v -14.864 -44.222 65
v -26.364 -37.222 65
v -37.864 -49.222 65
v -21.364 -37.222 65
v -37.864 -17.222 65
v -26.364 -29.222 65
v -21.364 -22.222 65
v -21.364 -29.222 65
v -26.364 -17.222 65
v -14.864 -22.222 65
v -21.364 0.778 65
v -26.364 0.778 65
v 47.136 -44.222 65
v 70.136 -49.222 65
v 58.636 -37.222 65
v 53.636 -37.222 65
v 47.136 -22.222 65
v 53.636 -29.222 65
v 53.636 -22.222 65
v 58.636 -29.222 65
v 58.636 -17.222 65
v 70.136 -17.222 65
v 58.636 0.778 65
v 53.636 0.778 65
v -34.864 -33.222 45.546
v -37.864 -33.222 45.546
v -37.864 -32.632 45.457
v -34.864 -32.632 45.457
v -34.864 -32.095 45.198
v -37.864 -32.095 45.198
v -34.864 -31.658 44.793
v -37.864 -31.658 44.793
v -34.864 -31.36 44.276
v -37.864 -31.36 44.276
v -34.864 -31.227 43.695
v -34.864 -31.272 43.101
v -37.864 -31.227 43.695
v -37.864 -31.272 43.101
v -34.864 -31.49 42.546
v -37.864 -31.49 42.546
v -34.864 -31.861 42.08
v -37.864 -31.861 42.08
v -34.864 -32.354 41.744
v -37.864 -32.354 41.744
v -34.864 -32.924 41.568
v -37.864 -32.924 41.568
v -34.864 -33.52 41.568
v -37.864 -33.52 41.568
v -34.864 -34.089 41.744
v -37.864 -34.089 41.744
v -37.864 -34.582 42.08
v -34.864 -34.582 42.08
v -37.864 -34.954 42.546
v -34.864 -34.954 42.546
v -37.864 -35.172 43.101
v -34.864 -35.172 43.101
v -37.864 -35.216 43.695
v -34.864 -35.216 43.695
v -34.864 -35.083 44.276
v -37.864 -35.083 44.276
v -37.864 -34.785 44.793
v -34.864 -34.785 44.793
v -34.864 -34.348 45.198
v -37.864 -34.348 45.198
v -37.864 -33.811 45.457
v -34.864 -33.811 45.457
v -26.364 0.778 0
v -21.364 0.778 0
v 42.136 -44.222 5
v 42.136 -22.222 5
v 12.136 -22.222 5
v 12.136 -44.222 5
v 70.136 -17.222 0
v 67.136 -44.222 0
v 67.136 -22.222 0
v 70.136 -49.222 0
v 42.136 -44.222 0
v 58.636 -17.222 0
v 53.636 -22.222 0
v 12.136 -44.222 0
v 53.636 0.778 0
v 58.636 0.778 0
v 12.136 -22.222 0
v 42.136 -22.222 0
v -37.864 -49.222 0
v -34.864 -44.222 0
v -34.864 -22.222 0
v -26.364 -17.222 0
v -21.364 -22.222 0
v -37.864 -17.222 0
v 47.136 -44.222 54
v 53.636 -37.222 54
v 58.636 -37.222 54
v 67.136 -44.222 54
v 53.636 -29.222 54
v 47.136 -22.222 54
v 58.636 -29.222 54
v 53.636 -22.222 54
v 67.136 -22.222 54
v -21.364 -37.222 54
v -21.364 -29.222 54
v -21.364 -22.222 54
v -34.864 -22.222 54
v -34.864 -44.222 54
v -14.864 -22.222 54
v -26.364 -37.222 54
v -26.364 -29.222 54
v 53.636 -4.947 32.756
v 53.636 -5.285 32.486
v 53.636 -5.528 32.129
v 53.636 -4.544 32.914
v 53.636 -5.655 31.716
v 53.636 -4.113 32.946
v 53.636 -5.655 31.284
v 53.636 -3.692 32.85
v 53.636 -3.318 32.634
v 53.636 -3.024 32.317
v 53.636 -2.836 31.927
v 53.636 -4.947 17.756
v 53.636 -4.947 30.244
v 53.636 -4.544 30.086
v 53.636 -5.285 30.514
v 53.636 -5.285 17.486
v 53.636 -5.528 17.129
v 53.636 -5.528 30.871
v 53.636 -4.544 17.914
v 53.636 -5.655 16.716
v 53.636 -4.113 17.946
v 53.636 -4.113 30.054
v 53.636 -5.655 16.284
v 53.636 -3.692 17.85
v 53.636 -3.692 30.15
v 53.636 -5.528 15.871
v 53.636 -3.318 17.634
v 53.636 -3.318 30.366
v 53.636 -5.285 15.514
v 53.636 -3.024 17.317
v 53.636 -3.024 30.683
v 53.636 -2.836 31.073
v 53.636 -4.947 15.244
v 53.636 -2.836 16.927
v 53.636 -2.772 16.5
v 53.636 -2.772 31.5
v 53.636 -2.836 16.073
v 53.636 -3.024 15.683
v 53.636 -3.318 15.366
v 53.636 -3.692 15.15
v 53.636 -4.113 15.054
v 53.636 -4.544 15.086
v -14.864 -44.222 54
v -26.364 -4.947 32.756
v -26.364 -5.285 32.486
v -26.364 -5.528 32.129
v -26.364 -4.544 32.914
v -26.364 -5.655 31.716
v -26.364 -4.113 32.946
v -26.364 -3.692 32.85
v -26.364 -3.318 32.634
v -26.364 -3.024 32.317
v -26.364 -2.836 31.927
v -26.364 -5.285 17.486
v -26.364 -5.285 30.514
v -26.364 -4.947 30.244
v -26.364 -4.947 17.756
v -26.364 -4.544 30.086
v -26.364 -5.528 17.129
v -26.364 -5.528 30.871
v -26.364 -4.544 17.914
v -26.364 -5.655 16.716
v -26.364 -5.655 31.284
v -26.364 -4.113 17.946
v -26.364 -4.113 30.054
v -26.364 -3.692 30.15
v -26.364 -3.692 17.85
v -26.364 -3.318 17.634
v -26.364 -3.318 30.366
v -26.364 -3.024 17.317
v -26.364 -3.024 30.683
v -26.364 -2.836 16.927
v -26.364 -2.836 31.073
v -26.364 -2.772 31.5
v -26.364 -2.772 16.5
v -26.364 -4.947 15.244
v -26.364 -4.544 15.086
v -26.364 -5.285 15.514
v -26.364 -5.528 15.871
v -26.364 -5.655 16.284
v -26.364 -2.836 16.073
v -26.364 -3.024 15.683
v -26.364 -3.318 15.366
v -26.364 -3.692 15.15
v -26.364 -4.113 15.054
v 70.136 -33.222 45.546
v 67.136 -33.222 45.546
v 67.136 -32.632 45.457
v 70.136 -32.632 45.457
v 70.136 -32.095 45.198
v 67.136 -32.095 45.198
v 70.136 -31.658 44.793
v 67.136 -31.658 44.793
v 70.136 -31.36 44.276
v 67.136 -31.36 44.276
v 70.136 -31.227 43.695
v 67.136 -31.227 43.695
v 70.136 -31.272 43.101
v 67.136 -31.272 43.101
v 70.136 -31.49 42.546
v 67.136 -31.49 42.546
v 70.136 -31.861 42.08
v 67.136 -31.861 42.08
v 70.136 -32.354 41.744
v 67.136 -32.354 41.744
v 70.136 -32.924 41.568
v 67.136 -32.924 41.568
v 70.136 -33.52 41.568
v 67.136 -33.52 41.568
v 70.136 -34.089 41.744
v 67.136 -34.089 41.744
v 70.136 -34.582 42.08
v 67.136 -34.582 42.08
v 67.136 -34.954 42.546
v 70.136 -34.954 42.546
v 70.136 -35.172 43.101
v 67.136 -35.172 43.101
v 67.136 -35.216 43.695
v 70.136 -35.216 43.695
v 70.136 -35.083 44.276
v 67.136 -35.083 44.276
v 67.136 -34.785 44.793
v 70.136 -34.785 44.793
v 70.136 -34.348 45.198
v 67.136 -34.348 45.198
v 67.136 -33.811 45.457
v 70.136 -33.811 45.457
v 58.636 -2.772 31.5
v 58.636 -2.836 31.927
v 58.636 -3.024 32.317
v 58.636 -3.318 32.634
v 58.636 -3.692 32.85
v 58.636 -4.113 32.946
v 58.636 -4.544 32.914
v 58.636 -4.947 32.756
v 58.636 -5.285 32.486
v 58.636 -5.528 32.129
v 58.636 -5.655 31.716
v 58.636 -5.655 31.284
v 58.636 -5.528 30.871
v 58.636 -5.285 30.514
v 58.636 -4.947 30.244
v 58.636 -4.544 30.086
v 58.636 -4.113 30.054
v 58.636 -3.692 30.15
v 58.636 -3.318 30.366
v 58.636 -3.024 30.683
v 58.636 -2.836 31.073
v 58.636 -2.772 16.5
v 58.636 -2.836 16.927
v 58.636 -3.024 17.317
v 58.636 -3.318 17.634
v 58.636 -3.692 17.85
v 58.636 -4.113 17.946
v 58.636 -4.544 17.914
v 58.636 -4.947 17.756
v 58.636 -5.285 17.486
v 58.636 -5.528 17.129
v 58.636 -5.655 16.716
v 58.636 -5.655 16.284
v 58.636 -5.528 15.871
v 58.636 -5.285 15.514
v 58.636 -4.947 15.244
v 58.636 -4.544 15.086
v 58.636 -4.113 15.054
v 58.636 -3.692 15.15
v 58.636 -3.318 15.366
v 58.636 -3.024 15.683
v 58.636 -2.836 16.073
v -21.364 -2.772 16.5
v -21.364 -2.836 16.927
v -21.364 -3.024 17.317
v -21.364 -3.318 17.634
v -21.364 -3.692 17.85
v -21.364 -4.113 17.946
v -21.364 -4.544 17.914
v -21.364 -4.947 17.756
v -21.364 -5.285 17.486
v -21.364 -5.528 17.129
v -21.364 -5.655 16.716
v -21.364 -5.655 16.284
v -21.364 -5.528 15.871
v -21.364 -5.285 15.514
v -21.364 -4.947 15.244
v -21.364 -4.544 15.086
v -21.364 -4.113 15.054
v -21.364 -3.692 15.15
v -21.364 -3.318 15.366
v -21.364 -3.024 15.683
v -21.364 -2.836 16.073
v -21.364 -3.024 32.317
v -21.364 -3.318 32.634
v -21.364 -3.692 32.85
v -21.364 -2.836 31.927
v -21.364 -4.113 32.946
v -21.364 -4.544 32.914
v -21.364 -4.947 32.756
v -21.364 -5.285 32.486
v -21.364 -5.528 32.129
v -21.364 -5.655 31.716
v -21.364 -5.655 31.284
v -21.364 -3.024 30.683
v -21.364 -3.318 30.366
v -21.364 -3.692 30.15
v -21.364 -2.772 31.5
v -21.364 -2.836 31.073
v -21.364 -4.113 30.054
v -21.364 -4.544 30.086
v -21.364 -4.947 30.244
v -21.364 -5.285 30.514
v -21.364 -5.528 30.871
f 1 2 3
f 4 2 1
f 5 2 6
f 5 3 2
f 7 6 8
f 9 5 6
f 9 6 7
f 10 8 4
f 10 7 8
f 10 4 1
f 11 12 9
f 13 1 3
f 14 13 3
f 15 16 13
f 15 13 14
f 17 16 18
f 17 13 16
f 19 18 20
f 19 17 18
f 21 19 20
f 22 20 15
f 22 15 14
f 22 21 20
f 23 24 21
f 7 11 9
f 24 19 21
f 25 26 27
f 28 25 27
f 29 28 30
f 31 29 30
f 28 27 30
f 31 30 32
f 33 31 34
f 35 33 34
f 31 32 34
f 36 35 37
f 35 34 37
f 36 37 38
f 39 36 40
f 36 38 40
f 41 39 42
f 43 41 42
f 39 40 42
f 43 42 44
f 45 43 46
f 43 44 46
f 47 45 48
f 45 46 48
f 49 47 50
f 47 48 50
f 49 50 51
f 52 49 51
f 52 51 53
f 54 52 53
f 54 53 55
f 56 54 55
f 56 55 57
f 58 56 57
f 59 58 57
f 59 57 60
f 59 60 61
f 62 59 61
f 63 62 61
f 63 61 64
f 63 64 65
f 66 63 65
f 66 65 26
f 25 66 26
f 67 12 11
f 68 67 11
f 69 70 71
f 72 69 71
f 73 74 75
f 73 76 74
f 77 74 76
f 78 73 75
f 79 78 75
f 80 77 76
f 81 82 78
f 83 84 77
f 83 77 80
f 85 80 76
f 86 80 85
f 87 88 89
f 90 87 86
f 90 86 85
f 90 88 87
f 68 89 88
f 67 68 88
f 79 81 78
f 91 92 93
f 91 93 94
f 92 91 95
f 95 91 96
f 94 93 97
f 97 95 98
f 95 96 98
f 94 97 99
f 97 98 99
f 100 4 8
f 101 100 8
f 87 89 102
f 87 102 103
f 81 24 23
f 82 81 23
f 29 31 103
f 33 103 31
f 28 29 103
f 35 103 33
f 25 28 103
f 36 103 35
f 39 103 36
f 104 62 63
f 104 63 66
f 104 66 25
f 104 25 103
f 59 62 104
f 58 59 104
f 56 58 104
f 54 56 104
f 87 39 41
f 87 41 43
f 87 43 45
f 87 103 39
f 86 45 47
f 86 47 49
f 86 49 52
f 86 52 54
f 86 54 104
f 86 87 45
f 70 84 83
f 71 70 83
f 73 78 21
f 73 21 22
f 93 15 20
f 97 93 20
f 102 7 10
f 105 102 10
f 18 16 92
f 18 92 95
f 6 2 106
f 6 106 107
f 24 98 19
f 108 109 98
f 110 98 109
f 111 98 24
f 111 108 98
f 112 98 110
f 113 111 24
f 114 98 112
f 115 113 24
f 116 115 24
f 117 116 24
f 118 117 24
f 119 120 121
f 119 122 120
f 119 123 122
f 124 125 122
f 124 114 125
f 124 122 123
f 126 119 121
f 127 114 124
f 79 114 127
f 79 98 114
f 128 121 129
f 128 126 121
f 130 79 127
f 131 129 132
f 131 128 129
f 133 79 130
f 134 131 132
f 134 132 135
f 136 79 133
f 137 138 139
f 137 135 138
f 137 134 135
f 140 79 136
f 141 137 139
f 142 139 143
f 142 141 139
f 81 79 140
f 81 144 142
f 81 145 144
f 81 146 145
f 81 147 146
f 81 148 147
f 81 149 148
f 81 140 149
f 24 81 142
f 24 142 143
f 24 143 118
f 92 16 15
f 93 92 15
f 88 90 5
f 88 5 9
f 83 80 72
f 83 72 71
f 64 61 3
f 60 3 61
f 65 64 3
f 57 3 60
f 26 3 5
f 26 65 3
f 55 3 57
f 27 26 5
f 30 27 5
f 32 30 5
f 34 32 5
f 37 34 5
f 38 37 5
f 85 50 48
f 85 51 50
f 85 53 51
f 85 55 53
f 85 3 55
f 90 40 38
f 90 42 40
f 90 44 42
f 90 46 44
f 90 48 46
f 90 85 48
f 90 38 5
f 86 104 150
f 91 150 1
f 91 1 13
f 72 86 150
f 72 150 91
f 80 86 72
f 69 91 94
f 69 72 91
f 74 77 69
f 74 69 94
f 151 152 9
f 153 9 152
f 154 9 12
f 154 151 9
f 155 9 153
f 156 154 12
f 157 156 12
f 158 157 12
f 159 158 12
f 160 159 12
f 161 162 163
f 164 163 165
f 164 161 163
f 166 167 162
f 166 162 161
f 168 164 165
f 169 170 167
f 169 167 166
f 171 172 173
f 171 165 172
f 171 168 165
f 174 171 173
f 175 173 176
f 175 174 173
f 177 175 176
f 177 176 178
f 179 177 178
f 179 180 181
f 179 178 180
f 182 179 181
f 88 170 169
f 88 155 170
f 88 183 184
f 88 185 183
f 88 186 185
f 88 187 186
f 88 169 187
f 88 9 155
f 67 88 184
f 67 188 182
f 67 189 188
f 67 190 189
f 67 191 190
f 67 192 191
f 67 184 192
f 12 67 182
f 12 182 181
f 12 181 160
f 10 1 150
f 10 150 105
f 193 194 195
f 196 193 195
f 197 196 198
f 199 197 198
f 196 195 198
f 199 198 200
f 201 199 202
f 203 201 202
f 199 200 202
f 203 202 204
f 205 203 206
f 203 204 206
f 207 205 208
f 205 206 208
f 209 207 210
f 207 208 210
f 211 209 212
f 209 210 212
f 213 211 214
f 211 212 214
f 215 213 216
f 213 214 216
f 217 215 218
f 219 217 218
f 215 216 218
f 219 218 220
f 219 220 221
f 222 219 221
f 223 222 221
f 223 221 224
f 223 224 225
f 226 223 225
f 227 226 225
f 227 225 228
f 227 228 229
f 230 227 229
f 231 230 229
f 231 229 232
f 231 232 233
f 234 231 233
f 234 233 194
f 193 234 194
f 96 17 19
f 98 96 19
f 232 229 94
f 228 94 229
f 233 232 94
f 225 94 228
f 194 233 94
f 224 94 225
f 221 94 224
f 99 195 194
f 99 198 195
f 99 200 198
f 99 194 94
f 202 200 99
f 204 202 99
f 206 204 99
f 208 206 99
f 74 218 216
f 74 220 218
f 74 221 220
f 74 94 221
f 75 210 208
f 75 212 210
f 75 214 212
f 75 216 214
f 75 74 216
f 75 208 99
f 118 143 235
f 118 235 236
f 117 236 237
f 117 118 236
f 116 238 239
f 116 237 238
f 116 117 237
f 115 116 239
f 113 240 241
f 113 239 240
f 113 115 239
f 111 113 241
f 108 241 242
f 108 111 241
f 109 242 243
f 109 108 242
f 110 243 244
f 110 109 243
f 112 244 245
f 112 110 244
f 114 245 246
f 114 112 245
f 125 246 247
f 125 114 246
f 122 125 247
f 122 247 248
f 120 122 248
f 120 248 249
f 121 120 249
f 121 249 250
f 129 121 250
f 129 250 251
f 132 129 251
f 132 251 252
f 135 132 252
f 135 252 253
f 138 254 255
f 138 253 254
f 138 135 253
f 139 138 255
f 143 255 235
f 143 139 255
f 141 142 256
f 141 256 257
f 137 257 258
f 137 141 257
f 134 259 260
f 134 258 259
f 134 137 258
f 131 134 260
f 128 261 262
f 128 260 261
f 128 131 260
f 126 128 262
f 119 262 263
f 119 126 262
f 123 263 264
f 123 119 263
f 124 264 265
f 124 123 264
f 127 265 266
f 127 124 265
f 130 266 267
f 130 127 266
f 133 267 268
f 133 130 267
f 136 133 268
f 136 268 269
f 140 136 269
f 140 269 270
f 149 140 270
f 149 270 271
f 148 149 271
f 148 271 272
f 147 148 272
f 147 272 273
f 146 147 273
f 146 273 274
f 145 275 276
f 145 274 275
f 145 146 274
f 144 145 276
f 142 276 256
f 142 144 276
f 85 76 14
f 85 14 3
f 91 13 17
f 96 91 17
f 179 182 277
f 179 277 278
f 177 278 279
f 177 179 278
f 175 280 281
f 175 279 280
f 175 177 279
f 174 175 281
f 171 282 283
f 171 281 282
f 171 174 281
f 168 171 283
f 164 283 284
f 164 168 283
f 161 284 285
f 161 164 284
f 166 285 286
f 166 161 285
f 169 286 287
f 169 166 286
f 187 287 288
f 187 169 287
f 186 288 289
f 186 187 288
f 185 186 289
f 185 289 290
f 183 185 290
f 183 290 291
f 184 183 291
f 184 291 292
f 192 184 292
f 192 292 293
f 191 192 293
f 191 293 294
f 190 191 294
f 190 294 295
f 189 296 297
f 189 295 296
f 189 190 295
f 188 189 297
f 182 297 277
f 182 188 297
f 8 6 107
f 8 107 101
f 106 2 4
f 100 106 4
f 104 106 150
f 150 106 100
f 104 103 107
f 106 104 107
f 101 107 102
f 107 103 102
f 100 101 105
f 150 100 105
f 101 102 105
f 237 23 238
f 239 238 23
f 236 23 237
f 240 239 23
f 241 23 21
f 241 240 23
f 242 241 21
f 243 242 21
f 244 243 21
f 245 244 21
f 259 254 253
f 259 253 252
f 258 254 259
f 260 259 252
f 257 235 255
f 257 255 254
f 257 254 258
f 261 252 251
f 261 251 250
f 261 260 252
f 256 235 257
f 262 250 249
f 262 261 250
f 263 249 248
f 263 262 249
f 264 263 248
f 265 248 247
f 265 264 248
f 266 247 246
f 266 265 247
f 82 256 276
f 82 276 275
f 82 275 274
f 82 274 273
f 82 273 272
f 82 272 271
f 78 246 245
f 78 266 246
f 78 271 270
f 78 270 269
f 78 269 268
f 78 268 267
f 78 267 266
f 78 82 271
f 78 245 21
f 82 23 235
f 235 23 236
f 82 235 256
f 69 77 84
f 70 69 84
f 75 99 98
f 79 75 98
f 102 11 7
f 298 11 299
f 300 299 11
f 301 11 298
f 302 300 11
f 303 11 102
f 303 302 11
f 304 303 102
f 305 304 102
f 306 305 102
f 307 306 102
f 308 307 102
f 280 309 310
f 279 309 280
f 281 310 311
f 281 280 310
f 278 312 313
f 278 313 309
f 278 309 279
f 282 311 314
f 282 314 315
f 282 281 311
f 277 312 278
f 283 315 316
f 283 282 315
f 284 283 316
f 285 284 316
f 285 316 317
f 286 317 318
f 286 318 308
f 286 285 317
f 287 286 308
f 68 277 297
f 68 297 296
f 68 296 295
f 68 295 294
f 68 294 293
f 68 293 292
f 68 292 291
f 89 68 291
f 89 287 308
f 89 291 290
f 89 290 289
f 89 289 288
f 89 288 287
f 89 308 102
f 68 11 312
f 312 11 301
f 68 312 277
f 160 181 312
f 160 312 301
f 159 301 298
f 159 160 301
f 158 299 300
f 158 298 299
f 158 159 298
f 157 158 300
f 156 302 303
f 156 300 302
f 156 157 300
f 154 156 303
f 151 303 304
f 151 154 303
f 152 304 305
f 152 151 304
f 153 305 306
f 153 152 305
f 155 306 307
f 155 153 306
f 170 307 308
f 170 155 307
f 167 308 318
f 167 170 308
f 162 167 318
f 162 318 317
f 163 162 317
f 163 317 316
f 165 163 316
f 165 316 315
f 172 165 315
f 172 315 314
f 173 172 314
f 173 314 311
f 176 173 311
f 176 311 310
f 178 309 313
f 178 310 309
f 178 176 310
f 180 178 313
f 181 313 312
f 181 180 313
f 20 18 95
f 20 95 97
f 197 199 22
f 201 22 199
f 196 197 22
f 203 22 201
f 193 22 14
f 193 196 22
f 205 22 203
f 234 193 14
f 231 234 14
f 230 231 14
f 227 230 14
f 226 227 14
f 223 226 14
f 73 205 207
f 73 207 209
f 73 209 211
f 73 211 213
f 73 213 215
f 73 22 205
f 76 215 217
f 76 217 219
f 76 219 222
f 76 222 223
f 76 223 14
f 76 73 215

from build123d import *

# Parameters (mm, degrees)
EXTRUDE_1_DEPTH          = 65
SKETCH_3_R               = 2
CUT_EXTRUDE_2_DEPTH      = 136.321005452
SKETCH_4_W               = 30
SKETCH_4_H               = 22
EXTRUDE_2_DEPTH          = 5
CUT_EXTRUDE_4_DEPTH      = 123.556209621
CUT_EXTRUDE_4_DEPTH_BACK = 123.556209621
SKETCH_9_R               = 1.45
SKETCH_10_W              = 20
SKETCH_10_H              = 22
SKETCH_10_W_2            = 5
SKETCH_10_H_2            = 8
EXTRUDE_6_DEPTH          = 11


with BuildPart() as part:
    # 草圖1 → 填料-伸長1 (new body)
    with BuildSketch(Plane.XY):
        Polygon((-26.364407373, 0.778312538), (-21.364407373, 0.778312538), (-21.364407373, -22.221687462), (-34.864407373, -22.221687462), (-34.864407373, -44.221687462), (67.135592627, -44.221687462), (67.135592627, -22.221687462), (53.635592627, -22.221687462), (53.635592627, 0.778312538), (58.635592627, 0.778312538), (58.635592627, -17.221687462), (70.135592627, -17.221687462), (70.135592627, -49.221687462), (-37.864407373, -49.221687462), (-37.864407373, -17.221687462), (-26.364407373, -17.221687462), align=None)
    extrude(amount=EXTRUDE_1_DEPTH)

    # 草圖3 → 除料-伸長2 (cut, through all)
    with BuildSketch(Plane.ZY.offset(37.864407373)):
        with Locations((43.545745688, -33.221687462)):
            Circle(SKETCH_3_R)
    extrude(amount=-CUT_EXTRUDE_2_DEPTH, mode=Mode.SUBTRACT)

    # 草圖4 → 填料-伸長2 (add)
    with BuildSketch(Plane(origin=(0, 0, 0), x_dir=(-1, 0, 0), z_dir=(0, 0, -1))):
        with Locations((-27.135592627, -33.221687462)):
            Rectangle(SKETCH_4_W, SKETCH_4_H)
    extrude(amount=-EXTRUDE_2_DEPTH)

    # 草圖9 → 除料-伸長4 (cut, two sides: drawn at the far end of the back side and taken through both)
    with BuildSketch(Plane(origin=(-21.364407373, 0, 0), x_dir=(0, 0, -1), z_dir=(1, 0, 0)).offset(-CUT_EXTRUDE_4_DEPTH_BACK)):
        with Locations(Location((-31.5, -4.221687462, 0), (0, 0, 90))):
            Circle(SKETCH_9_R)
        with Locations(Location((-16.5, -4.221687462, 0), (0, 0, 90))):
            Circle(SKETCH_9_R)
    extrude(amount=CUT_EXTRUDE_4_DEPTH + CUT_EXTRUDE_4_DEPTH_BACK, mode=Mode.SUBTRACT)

    # 草圖10 → 填料-伸長6 (add)
    # profile 1 of 2: a face of its own
    with BuildSketch(Plane.XY.offset(65)):
        with Locations((-24.864407373, -33.221687462)):
            Rectangle(SKETCH_10_W, SKETCH_10_H)
        with Locations((-23.864407373, -33.221687462)):
            Rectangle(SKETCH_10_W_2, SKETCH_10_H_2, mode=Mode.SUBTRACT)
    # profile 2 of 2: a face of its own
    with BuildSketch(Plane.XY.offset(65)):
        with Locations((57.135592627, -33.221687462)):
            Rectangle(SKETCH_10_W, SKETCH_10_H)
        with Locations((56.135592627, -33.221687462)):
            Rectangle(SKETCH_10_W_2, SKETCH_10_H_2, mode=Mode.SUBTRACT)
    extrude(amount=-EXTRUDE_6_DEPTH)


solid = part.part
